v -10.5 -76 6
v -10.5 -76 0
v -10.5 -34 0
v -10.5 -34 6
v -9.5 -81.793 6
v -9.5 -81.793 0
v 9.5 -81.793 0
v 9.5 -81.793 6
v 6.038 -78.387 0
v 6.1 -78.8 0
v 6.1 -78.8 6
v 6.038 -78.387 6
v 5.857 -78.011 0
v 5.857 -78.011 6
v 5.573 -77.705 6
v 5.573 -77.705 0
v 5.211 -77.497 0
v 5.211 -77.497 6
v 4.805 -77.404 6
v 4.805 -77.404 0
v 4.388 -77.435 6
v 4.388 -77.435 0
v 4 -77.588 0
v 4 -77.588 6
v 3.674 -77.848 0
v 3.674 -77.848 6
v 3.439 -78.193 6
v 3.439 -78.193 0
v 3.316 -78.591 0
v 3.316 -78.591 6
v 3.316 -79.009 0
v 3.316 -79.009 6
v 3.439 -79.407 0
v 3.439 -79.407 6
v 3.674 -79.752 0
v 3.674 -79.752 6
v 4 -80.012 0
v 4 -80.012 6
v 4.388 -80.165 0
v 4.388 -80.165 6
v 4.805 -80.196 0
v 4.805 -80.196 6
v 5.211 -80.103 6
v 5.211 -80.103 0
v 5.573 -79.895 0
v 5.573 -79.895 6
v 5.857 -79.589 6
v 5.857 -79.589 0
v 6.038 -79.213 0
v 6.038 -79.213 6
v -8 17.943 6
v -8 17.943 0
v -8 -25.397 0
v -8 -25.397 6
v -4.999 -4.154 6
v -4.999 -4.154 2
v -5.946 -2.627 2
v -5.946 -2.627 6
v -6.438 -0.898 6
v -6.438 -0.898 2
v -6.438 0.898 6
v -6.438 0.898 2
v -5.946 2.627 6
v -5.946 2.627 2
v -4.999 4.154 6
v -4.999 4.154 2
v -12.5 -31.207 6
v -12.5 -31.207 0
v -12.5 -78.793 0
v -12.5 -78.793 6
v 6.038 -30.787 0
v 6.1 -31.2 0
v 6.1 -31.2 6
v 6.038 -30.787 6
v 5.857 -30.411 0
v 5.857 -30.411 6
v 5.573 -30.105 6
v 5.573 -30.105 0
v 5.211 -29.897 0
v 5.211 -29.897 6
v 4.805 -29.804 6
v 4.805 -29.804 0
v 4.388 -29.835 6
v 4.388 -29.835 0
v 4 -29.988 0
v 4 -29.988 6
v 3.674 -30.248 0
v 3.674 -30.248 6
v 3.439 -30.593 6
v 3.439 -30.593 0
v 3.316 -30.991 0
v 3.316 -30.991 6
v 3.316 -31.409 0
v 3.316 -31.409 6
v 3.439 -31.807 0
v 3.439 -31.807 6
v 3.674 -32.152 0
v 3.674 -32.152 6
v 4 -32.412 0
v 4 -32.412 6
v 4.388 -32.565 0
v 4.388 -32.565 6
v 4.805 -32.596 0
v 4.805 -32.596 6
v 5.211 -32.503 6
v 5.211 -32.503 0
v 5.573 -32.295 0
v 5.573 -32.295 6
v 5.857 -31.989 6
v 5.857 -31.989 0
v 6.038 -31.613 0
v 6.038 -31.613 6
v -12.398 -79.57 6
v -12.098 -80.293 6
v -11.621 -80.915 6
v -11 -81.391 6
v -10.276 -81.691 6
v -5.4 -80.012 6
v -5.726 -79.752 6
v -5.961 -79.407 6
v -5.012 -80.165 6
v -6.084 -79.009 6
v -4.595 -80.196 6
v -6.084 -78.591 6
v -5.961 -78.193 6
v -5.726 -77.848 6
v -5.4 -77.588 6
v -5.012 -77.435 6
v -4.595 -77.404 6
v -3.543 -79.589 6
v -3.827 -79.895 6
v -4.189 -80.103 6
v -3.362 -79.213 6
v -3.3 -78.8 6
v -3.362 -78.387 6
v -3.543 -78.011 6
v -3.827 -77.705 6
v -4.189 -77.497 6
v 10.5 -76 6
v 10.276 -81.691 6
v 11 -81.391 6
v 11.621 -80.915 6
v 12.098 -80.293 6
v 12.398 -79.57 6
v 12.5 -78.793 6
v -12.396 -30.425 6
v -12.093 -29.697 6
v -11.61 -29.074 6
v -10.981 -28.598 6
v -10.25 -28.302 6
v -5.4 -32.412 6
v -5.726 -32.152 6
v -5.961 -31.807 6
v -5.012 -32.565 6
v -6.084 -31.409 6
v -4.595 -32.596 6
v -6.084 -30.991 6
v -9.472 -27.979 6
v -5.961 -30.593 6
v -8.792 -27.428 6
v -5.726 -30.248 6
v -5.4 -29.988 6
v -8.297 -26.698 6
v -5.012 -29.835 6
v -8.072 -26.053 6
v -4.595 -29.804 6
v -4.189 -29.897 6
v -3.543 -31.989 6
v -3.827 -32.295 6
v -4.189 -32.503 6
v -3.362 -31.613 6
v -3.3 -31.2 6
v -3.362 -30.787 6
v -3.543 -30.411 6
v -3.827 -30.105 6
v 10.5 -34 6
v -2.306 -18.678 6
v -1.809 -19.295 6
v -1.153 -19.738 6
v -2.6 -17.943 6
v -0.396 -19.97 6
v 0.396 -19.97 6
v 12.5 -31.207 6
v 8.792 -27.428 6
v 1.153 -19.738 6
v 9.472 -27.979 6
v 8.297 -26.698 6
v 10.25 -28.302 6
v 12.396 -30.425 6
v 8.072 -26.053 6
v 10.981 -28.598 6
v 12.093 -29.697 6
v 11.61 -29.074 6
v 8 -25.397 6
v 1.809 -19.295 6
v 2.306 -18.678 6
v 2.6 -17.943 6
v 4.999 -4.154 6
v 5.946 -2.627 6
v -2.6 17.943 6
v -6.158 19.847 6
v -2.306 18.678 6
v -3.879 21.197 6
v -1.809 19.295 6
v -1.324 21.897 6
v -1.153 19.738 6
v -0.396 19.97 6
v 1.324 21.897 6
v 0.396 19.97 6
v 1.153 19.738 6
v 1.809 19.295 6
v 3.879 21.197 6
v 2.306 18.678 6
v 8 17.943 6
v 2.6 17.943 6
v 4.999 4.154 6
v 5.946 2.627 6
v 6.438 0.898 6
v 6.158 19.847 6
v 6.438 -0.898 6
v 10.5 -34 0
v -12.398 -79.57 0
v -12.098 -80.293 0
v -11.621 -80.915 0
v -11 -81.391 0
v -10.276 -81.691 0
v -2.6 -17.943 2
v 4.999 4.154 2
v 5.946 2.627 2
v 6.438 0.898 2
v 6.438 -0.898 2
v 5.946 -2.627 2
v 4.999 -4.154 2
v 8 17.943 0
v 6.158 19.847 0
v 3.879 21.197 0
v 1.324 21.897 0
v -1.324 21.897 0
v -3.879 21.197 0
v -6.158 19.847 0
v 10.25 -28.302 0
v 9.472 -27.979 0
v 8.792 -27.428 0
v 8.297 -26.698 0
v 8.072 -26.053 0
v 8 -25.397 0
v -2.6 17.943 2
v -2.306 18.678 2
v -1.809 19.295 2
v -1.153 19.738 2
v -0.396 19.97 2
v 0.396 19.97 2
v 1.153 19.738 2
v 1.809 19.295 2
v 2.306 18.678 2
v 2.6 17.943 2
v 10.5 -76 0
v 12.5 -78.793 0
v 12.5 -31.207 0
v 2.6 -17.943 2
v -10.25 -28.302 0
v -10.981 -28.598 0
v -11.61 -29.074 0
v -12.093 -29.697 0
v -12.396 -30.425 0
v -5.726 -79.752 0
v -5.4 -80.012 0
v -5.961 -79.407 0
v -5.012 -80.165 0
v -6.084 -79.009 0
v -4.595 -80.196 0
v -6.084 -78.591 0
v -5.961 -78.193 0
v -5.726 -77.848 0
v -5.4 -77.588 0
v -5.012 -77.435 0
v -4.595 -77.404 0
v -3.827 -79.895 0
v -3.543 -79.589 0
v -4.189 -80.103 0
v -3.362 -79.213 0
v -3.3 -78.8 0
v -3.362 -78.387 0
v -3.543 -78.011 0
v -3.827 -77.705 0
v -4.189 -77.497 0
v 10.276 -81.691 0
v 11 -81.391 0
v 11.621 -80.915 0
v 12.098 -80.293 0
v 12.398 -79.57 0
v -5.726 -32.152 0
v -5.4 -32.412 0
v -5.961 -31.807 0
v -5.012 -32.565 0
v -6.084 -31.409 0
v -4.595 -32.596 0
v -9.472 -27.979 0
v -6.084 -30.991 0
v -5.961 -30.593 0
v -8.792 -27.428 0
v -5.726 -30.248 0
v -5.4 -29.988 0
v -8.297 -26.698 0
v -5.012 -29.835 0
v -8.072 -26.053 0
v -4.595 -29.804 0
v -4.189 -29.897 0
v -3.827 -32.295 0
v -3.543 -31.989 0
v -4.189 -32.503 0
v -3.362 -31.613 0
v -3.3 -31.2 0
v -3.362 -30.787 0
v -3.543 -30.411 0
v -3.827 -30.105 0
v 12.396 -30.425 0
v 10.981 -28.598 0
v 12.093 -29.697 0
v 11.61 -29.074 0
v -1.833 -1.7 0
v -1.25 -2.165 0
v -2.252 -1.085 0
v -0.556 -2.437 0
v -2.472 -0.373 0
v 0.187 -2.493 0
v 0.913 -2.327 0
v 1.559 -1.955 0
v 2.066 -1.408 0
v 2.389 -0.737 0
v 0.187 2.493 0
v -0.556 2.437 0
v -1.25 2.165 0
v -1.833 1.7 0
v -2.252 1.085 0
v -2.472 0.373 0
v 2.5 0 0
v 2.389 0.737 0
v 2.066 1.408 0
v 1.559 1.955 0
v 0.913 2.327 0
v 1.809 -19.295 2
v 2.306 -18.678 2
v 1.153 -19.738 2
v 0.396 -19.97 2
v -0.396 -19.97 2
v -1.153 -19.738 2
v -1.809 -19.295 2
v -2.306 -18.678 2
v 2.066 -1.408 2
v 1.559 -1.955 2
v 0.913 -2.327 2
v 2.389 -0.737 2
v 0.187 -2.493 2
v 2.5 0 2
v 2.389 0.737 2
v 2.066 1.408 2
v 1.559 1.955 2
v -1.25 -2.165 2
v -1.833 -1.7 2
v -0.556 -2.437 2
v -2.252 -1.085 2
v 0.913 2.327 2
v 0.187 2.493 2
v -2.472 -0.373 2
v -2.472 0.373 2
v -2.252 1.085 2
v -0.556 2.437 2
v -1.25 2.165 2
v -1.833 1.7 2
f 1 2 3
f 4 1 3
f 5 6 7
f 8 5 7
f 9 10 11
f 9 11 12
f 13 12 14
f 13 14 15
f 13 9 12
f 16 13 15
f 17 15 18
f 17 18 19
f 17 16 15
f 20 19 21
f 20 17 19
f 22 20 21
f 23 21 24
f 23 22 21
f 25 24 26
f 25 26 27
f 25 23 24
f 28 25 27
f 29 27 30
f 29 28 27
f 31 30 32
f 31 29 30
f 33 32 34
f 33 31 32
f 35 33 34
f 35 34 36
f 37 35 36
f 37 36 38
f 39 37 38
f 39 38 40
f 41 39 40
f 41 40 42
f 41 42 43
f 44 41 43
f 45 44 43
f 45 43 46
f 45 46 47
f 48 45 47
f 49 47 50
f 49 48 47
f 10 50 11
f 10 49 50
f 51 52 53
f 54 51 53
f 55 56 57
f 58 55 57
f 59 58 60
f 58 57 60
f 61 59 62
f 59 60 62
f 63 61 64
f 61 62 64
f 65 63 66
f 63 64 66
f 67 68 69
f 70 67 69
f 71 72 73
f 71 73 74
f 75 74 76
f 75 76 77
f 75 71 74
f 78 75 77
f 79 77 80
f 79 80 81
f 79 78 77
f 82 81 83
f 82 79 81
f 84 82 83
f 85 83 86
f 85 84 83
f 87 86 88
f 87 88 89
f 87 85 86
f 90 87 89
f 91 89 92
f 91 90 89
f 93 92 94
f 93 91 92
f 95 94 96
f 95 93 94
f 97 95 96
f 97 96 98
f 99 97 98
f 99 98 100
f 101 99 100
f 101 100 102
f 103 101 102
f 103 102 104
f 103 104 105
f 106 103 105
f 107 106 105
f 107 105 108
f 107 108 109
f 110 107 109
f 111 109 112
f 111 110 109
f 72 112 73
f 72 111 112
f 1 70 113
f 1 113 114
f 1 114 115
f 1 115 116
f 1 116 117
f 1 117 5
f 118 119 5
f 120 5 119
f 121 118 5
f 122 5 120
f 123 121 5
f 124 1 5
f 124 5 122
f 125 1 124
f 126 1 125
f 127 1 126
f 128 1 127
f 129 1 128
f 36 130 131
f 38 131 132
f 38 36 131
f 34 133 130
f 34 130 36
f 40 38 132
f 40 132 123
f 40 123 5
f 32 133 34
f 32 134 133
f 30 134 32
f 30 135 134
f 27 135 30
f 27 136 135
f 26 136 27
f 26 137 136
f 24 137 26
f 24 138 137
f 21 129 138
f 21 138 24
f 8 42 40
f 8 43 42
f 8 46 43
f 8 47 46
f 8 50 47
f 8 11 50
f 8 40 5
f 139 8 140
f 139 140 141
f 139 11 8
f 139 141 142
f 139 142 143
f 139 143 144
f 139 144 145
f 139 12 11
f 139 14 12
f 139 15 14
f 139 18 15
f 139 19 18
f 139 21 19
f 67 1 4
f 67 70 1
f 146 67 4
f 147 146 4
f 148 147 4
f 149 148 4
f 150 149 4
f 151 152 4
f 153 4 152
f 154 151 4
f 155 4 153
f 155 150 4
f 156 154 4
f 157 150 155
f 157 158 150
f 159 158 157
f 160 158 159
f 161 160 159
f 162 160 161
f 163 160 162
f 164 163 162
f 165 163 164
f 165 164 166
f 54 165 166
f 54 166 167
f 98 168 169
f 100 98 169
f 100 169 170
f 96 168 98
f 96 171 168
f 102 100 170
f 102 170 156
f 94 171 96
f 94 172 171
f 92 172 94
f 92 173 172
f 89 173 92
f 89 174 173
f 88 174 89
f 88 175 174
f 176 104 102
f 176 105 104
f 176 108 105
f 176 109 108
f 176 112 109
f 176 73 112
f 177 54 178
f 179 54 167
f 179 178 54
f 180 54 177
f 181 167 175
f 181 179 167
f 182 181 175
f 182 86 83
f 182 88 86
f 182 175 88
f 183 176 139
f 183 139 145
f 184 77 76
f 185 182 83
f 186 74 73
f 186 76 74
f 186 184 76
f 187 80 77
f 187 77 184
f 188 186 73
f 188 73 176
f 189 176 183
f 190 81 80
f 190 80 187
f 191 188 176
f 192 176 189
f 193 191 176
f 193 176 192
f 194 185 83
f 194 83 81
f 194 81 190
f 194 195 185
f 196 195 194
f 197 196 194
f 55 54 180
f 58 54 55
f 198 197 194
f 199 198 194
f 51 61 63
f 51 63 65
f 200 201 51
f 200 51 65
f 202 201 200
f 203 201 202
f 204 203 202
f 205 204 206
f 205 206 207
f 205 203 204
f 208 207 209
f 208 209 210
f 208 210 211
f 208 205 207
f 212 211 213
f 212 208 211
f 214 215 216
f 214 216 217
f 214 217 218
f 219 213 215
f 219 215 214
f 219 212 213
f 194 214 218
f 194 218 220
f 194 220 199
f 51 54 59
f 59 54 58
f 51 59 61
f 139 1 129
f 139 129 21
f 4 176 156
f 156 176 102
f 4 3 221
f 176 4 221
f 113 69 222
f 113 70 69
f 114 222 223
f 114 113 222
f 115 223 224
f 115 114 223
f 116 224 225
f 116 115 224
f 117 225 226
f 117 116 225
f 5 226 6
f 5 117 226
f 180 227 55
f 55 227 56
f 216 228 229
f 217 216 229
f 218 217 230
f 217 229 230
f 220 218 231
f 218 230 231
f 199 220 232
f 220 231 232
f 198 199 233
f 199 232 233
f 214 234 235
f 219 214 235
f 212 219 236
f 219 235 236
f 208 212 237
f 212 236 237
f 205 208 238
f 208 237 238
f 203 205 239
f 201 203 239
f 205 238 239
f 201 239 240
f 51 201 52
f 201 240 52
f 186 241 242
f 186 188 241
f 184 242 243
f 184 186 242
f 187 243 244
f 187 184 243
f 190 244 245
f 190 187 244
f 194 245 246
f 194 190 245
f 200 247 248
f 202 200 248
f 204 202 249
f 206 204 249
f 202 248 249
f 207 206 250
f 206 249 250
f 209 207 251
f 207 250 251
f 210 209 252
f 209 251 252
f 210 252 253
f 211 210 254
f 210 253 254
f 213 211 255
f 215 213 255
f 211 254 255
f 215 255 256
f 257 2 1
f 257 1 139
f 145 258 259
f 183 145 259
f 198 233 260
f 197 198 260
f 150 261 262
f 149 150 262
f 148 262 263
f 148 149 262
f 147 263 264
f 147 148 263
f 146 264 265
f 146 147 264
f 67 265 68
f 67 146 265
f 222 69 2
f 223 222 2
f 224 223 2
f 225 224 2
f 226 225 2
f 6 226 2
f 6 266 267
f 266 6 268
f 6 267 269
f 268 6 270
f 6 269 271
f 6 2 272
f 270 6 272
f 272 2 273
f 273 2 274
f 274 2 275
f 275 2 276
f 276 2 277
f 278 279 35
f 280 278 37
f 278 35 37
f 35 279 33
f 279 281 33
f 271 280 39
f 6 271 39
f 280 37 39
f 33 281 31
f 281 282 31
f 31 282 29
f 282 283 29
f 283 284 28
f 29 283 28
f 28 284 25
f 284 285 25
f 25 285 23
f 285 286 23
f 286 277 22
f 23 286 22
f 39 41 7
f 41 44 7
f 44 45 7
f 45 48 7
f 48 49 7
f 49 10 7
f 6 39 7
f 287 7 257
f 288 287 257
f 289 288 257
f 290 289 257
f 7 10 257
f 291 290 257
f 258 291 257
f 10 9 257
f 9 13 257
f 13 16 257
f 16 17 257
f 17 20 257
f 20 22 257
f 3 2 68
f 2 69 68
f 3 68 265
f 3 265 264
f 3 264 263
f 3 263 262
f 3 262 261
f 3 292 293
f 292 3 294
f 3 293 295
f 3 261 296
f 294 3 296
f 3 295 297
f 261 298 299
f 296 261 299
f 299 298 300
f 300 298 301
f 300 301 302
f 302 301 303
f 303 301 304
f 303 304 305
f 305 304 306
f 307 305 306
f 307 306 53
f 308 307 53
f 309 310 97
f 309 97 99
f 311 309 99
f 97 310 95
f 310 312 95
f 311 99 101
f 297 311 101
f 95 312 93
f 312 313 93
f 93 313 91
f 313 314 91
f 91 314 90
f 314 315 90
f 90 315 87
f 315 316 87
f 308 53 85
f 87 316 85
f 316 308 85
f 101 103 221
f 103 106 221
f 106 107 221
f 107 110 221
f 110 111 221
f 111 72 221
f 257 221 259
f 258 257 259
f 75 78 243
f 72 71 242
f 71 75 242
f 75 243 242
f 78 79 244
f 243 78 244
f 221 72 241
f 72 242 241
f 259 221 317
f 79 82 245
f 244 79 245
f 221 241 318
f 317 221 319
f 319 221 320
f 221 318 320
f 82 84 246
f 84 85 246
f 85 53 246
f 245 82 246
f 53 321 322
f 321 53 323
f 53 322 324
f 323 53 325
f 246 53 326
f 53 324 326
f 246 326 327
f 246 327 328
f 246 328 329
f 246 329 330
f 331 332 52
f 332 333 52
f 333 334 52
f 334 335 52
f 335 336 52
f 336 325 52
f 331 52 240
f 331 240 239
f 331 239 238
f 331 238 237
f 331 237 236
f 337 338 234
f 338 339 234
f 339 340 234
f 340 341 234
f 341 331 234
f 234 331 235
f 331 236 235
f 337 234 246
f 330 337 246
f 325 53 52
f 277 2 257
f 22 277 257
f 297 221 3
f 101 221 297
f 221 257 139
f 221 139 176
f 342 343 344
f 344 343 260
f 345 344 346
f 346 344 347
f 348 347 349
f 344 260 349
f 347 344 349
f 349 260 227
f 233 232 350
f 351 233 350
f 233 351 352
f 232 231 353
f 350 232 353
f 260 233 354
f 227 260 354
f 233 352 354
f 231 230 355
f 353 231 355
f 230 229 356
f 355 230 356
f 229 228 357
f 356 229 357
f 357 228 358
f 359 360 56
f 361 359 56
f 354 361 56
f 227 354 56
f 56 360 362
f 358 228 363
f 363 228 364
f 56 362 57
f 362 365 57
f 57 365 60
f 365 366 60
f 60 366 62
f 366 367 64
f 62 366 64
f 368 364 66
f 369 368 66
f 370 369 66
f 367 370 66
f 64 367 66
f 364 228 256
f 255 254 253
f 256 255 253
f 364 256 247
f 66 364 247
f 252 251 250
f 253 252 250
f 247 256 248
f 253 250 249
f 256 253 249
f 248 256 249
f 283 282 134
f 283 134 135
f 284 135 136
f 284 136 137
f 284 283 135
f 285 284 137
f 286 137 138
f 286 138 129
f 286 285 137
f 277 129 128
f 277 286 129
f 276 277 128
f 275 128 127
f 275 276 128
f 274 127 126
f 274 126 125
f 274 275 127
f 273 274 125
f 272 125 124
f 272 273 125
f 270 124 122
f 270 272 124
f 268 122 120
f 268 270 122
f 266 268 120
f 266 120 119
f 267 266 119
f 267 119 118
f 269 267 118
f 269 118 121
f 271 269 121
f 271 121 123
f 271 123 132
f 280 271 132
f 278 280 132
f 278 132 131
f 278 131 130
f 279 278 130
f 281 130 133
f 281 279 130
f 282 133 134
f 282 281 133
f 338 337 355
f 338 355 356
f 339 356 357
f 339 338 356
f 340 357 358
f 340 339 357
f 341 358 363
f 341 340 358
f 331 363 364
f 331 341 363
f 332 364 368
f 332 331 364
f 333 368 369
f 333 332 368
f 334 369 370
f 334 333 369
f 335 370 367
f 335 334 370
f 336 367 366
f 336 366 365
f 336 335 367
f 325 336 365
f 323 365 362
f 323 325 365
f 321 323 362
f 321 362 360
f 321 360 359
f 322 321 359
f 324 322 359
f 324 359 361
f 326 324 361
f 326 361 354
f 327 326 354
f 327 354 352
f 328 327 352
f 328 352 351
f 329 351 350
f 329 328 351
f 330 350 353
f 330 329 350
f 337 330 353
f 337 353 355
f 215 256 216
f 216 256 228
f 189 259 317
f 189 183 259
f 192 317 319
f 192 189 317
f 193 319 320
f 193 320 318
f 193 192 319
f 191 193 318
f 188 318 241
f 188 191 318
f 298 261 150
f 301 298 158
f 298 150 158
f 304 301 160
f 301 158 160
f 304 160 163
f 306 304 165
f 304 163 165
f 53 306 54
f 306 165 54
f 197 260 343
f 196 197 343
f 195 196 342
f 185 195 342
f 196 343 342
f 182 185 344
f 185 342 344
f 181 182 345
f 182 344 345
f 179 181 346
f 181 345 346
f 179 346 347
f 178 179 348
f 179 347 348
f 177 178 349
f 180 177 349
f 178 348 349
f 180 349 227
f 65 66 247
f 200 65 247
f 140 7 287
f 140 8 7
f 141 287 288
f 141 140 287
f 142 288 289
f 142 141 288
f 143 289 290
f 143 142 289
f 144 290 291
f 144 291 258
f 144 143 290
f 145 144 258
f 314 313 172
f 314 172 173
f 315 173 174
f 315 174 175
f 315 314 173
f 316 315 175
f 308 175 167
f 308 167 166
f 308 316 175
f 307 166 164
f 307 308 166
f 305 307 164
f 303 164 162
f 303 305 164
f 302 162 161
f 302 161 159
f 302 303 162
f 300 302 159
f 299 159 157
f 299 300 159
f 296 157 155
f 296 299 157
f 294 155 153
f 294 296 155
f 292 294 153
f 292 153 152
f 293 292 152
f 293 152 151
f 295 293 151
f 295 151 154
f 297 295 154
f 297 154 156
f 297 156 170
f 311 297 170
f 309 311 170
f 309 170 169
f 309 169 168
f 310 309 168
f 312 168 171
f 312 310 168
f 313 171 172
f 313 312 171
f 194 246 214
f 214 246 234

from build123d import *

# Parameters (mm, degrees)
SKETCH_1_R      = 1.4
SKETCH_1_W      = 21
SKETCH_1_H      = 42
EXTRUDE_1_DEPTH = 6
FILLET_6_R      = 3
FILLET_7_R      = 3
FILLET_8_R      = 3
FILLET_9_R      = 3
FILLET_10_R     = 3
FILLET_11_R     = 3
SKETCH_2_R      = 2.5
EXTRUDE_2_DEPTH = 2


with BuildPart() as part:
    # 草圖1 → 填料-伸長1 (new body)
    with BuildSketch(Plane.XY):
        with BuildLine():
            Line((8, -18.141285654), (8, 17.94275172))
            ThreePointArc((8, 17.94275172), (0, 21.985231559), (-8, 17.94275172))
            Line((-8, 17.94275172), (-8, -18.141285654))
            Line((-8, -18.141285654), (-8, -28.206652459))
            Line((-8, -28.206652459), (-12.5, -28.206652459))
            Line((-12.5, -28.206652459), (-12.5, -81.793347541))
            Line((-12.5, -81.793347541), (12.5, -81.793347541))
            Line((12.5, -81.793347541), (12.5, -28.206652459))
            Line((12.5, -28.206652459), (8, -28.206652459))
            Line((8, -28.206652459), (8, -18.141285654))
        make_face()
        with Locations((-4.7, -78.8)):
            Circle(SKETCH_1_R, mode=Mode.SUBTRACT)
        with Locations((0, -55)):
            Rectangle(SKETCH_1_W, SKETCH_1_H, mode=Mode.SUBTRACT)
        with Locations((-4.7, -31.2)):
            Circle(SKETCH_1_R, mode=Mode.SUBTRACT)
        with Locations((4.7, -78.8)):
            Circle(SKETCH_1_R, mode=Mode.SUBTRACT)
        with Locations((4.7, -31.2)):
            Circle(SKETCH_1_R, mode=Mode.SUBTRACT)
        with BuildLine():
            ThreePointArc((-4.999271035, -4.154189345), (-6.5, 0), (-4.999271035, 4.154189345))
            Line((-4.999271035, 4.154189345), (-2.6, 17.94275172))
            ThreePointArc((-2.6, 17.94275172), (0, 20), (2.6, 17.94275172))
            Line((2.6, 17.94275172), (4.999271035, 4.154189345))
            ThreePointArc((4.999271035, 4.154189345), (6.5, 0), (4.999271035, -4.154189345))
            Line((4.999271035, -4.154189345), (2.6, -17.94275172))
            ThreePointArc((2.6, -17.94275172), (0, -20), (-2.6, -17.94275172))
            Line((-2.6, -17.94275172), (-4.999271035, -4.154189345))
        make_face(mode=Mode.SUBTRACT)
    extrude(amount=EXTRUDE_1_DEPTH)

    # 圓角6
    fillet_6_edges = [part.edges().sort_by_distance(p)[0] for p in [
        (-12.5, -81.793347541, 3),
    ]]
    fillet(fillet_6_edges, radius=FILLET_6_R)

    # 圓角7
    fillet_7_edges = [part.edges().sort_by_distance(p)[0] for p in [
        (12.5, -81.793347541, 3),
    ]]
    fillet(fillet_7_edges, radius=FILLET_7_R)

    # 圓角8
    fillet_8_edges = [part.edges().sort_by_distance(p)[0] for p in [
        (12.5, -28.206652459, 3),
    ]]
    fillet(fillet_8_edges, radius=FILLET_8_R)

    # 圓角9
    fillet_9_edges = [part.edges().sort_by_distance(p)[0] for p in [
        (8, -28.206652459, 3),
    ]]
    fillet(fillet_9_edges, radius=FILLET_9_R)

    # 圓角10
    fillet_10_edges = [part.edges().sort_by_distance(p)[0] for p in [
        (-12.5, -28.206652459, 3),
    ]]
    fillet(fillet_10_edges, radius=FILLET_10_R)

    # 圓角11
    fillet_11_edges = [part.edges().sort_by_distance(p)[0] for p in [
        (-8, -28.206652459, 3),
    ]]
    fillet(fillet_11_edges, radius=FILLET_11_R)

    # 草圖2 → 填料-伸長2 (add)
    with BuildSketch(Plane.XY):
        with BuildLine():
            Line((-3.702325647, 20.172267208), (4.497563026, 20.172267208))
            ThreePointArc((4.497563026, 20.172267208), (6.068658829, 19.068237677), (7.032818959, 17.407629814))
            Line((7.032818959, 17.407629814), (7.032818959, -20.628324178))
            Line((7.032818959, -20.628324178), (-6.646673958, -20.628324178))
            Line((-6.646673958, -20.628324178), (-6.646673958, 17.471058727))
            ThreePointArc((-6.646673958, 17.471058727), (-5.621736824, 19.309156464), (-3.702325647, 20.172267208))
        make_face()
        Circle(SKETCH_2_R, mode=Mode.SUBTRACT)
    extrude(amount=EXTRUDE_2_DEPTH)


solid = part.part
